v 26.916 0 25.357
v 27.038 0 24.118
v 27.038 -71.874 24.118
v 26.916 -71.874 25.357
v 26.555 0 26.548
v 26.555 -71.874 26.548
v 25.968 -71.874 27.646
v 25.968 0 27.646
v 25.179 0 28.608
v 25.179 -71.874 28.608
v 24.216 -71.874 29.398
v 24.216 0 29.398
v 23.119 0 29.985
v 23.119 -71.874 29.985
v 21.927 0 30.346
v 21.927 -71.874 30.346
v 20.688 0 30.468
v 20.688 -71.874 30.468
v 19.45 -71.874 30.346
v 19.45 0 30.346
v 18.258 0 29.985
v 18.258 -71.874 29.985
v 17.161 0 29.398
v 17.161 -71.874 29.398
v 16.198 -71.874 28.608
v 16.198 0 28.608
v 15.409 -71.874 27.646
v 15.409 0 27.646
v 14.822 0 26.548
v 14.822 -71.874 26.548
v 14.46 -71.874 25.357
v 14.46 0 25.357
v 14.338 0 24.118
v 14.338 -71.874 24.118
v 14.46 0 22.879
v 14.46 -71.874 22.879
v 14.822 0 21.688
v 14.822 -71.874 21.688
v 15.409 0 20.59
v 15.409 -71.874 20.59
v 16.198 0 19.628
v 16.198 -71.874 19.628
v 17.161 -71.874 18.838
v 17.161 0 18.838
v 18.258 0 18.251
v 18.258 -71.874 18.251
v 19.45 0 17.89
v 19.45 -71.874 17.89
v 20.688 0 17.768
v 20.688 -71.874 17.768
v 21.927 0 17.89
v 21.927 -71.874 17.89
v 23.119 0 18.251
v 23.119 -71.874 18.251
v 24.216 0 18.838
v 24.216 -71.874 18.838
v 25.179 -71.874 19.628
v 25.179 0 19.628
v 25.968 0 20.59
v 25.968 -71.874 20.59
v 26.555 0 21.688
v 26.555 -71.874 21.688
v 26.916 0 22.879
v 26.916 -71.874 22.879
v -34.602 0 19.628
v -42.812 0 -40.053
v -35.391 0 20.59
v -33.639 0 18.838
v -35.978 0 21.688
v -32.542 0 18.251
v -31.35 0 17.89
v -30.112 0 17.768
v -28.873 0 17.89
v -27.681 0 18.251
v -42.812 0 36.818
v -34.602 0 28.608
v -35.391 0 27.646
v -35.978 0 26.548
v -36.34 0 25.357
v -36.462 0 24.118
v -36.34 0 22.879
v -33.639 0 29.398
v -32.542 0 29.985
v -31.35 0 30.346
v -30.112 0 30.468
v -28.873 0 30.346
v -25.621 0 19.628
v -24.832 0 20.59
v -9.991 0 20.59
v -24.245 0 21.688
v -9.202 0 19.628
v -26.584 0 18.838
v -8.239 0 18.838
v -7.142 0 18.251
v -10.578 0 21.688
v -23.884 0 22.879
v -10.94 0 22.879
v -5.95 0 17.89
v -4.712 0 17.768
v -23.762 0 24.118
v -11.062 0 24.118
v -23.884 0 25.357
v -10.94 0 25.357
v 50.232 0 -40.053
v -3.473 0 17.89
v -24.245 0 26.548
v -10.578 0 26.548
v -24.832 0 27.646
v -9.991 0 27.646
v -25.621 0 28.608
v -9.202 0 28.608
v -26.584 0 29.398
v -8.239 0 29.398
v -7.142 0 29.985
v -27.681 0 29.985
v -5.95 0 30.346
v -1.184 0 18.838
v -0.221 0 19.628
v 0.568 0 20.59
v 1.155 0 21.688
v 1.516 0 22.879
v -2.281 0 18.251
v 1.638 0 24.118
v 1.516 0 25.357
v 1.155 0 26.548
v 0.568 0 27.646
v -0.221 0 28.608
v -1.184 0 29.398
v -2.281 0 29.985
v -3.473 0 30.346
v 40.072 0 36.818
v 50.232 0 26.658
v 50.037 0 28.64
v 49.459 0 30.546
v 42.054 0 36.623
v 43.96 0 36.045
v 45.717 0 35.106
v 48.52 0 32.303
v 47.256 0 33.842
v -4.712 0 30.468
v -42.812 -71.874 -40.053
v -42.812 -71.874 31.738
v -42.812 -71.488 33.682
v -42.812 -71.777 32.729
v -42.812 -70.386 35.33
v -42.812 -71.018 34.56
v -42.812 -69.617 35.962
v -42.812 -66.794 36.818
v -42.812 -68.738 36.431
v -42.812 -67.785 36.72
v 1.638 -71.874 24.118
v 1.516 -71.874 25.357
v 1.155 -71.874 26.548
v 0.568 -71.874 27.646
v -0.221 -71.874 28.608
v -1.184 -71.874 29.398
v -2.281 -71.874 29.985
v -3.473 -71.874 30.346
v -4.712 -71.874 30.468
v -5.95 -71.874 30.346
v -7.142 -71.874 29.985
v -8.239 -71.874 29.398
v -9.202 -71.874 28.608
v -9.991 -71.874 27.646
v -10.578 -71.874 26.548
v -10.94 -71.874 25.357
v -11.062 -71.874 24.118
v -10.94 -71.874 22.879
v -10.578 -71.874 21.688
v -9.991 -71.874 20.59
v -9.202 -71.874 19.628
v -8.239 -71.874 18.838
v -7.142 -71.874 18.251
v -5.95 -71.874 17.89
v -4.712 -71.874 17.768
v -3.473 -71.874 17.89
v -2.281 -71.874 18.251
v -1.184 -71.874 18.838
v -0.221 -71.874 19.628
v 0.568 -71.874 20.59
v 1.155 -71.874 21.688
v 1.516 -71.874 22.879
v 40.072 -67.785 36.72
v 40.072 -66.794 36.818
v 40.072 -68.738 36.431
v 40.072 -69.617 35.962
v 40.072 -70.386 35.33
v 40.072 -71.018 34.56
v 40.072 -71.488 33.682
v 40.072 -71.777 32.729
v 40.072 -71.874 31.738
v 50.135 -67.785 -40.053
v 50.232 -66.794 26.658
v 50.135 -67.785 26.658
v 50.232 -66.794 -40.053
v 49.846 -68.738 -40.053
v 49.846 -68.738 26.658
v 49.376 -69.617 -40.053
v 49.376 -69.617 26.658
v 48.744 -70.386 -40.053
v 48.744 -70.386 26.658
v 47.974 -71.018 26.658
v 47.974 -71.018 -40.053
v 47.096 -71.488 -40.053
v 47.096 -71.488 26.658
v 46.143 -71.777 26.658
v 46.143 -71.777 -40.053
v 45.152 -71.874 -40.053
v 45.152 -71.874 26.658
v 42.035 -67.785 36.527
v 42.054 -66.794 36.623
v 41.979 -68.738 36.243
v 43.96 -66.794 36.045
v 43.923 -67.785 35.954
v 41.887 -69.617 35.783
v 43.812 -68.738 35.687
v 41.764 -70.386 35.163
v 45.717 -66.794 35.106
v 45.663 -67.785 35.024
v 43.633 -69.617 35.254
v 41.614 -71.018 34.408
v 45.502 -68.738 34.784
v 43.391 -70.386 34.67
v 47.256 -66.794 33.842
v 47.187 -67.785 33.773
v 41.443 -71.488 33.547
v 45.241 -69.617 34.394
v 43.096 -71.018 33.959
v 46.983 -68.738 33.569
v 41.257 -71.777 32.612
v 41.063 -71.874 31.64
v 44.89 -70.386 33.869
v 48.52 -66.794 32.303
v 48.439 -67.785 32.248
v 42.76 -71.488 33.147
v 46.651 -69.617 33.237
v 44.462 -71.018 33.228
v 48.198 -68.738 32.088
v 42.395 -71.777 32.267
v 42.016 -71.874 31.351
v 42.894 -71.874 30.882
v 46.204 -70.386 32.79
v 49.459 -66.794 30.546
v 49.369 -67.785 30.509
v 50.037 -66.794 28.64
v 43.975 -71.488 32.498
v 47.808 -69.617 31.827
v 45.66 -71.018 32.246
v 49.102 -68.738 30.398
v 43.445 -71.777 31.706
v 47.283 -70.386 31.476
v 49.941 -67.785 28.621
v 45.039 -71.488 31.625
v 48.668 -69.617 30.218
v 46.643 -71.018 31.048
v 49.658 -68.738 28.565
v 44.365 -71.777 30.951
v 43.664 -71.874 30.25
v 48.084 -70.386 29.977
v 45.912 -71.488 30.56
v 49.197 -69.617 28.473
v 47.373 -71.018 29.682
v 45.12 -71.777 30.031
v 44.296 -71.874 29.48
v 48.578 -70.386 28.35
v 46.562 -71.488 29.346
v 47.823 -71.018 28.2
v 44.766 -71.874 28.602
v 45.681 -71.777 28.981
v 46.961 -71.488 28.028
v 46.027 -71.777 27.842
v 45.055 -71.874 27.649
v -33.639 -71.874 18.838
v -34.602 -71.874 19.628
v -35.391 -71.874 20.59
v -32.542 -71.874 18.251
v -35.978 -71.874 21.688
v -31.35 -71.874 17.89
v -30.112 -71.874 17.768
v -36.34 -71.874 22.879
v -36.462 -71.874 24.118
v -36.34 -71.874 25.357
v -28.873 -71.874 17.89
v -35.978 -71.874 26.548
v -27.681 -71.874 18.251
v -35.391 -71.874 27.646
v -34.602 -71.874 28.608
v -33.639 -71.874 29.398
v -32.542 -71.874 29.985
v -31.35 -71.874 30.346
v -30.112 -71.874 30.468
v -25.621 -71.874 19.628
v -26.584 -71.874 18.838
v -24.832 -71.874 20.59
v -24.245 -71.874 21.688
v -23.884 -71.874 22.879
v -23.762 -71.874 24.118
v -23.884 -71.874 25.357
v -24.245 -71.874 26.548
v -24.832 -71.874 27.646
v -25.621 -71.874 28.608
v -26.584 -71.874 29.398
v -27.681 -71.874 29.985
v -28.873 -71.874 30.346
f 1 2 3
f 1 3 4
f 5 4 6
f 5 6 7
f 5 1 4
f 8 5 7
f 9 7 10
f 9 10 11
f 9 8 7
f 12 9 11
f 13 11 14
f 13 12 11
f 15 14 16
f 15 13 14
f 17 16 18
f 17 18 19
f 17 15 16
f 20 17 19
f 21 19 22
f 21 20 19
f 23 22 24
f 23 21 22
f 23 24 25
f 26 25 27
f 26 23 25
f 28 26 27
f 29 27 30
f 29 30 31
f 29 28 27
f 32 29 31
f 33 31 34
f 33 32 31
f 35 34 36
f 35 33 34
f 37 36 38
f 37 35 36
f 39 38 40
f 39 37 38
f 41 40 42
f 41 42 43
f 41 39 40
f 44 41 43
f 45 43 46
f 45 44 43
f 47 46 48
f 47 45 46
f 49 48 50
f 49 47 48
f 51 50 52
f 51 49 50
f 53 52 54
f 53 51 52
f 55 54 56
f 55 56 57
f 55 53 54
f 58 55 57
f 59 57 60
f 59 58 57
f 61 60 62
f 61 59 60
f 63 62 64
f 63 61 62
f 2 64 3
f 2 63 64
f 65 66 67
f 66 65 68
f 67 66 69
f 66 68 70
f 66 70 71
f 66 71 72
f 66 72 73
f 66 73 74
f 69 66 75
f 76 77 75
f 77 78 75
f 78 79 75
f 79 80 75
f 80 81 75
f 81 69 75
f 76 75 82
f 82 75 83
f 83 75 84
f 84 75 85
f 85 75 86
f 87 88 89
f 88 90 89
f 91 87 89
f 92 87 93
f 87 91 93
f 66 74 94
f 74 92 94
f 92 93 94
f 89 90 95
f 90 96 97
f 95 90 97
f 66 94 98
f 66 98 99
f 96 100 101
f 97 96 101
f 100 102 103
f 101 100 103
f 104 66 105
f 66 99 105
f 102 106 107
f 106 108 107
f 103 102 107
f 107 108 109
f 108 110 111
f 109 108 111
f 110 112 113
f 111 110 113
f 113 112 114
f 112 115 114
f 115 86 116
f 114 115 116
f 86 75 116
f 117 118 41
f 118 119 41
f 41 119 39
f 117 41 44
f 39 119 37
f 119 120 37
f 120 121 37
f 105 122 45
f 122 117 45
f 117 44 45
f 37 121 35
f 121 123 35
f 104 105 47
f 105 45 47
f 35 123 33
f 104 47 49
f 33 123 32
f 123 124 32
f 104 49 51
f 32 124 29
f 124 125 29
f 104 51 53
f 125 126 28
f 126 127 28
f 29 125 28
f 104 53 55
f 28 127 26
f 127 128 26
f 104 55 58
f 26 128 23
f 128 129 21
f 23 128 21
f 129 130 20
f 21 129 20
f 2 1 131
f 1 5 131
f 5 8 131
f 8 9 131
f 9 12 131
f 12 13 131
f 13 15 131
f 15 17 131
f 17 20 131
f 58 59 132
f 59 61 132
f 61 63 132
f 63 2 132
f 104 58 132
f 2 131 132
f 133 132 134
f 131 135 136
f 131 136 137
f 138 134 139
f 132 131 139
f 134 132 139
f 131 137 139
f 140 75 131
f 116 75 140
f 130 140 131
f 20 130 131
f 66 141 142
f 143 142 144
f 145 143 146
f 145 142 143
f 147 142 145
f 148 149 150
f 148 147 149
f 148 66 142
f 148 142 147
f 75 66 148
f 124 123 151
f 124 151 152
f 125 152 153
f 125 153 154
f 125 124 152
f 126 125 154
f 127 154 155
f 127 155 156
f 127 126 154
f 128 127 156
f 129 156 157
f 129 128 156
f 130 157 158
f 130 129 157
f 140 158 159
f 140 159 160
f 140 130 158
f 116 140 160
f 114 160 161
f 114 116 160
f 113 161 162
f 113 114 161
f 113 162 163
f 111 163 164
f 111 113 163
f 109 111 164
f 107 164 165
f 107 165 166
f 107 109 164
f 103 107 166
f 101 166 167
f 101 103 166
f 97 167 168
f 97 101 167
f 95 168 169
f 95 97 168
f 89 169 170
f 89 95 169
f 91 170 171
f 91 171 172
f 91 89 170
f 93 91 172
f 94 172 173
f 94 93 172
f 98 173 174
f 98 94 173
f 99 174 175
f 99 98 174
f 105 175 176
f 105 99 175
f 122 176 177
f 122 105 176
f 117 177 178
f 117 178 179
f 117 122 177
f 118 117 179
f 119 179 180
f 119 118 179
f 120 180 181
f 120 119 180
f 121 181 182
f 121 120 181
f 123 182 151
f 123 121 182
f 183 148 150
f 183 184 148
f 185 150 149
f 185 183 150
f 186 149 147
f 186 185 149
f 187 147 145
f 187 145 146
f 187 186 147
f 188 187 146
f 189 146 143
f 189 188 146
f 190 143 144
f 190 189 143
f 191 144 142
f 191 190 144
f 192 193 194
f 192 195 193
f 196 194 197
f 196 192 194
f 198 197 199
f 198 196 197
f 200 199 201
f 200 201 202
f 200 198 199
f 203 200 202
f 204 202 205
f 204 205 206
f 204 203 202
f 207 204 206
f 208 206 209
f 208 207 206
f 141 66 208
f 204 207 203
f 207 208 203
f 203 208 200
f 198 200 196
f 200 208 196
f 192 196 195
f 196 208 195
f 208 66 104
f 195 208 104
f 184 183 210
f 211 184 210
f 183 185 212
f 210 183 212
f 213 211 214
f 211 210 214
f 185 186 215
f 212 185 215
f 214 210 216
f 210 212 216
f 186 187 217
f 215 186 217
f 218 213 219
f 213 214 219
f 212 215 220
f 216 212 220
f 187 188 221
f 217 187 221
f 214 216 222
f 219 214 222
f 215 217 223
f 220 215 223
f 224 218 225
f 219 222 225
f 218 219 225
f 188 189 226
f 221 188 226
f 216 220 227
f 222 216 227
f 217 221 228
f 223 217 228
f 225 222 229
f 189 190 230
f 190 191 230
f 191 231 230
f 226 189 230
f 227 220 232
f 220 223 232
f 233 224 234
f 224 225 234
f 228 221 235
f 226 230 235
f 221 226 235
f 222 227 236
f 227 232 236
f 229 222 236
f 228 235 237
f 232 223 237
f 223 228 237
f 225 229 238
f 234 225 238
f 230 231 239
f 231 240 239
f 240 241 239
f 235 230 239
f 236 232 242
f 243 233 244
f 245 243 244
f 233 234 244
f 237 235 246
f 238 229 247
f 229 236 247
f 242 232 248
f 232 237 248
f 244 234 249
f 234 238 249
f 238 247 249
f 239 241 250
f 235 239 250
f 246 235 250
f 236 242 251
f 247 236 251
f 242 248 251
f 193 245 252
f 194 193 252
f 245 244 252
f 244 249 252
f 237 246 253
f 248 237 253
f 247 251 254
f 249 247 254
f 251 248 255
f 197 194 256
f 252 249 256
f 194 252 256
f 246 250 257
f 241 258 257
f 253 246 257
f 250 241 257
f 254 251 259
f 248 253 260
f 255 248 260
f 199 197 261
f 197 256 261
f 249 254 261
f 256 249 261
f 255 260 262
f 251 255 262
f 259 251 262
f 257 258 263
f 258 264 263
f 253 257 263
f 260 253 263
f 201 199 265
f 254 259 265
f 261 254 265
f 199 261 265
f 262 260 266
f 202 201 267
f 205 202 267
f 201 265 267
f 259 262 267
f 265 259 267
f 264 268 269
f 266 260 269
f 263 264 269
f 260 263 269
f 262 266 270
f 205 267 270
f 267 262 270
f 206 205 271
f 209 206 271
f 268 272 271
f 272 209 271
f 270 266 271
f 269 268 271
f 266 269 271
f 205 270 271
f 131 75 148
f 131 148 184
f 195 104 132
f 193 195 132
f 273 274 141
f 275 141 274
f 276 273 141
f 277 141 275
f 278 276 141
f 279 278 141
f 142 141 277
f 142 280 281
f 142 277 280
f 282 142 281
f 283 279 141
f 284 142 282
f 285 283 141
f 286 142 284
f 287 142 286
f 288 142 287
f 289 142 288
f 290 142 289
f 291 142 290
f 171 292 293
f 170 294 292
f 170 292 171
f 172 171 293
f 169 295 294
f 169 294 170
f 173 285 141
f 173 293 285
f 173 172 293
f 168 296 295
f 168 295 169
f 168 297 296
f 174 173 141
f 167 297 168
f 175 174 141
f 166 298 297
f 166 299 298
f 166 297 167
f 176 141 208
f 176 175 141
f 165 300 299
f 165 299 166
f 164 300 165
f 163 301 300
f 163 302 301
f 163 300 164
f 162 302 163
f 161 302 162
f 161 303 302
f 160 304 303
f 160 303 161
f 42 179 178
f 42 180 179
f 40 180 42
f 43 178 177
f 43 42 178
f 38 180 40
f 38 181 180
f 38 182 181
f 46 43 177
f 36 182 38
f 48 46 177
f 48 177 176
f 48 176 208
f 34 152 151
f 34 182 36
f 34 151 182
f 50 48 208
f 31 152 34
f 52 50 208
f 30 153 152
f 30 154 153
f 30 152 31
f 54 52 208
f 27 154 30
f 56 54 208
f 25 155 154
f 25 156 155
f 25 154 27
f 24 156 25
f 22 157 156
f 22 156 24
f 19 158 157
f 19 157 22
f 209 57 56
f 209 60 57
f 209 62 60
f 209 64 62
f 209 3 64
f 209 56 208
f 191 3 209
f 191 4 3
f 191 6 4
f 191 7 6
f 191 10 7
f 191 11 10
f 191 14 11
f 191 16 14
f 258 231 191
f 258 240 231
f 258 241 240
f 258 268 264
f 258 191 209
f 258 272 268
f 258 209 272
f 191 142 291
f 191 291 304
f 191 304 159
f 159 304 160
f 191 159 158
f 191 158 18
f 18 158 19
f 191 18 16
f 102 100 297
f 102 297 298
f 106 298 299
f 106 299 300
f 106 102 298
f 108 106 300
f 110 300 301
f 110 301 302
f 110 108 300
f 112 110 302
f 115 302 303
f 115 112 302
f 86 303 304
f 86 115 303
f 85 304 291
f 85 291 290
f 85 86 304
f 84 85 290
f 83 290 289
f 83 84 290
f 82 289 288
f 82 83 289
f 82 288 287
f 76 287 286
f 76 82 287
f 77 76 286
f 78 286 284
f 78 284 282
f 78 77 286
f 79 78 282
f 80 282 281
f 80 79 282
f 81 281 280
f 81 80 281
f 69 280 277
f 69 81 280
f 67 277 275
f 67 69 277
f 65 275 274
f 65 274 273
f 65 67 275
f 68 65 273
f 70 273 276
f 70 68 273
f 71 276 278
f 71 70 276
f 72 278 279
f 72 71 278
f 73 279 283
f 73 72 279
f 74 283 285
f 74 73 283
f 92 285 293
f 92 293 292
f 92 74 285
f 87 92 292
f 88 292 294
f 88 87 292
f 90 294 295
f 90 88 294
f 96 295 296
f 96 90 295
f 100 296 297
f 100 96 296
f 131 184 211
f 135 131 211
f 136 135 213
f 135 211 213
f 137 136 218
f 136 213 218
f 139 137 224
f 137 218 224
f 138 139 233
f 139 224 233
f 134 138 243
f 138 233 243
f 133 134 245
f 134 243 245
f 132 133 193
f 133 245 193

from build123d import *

# Parameters (mm, degrees)
F0_W     = 93.043737
F0_H     = 76.870489
F0_R     = 6.35
F1_DEPTH = 71.87439
F2_R     = 10.16
F3_R     = 5.08


with BuildPart() as f1:
    # F0 (on Front) → F1 (new body)
    with BuildSketch(Plane.XZ):
        with Locations((3.710334, -1.617325)):
            Rectangle(F0_W, F0_H)
        with Locations((-30.111535, 24.117919)):
            Circle(F0_R, mode=Mode.SUBTRACT)
        with Locations((-4.711535, 24.117919)):
            Circle(F0_R, mode=Mode.SUBTRACT)
        with Locations((20.688465, 24.117919)):
            Circle(F0_R, mode=Mode.SUBTRACT)
    extrude(amount=F1_DEPTH)

    # F2
    f2_edges = [f1.edges().sort_by_distance(p)[0] for p in [
        (50.232202, -35.937195, 36.817919),
    ]]
    fillet(f2_edges, radius=F2_R)

    # F3
    f3_edges = [f1.edges().sort_by_distance(p)[0] for p in [
        (-1.369667, -71.87439, 36.817919),
    ]]
    fillet(f3_edges, radius=F3_R)


solid = f1.part
